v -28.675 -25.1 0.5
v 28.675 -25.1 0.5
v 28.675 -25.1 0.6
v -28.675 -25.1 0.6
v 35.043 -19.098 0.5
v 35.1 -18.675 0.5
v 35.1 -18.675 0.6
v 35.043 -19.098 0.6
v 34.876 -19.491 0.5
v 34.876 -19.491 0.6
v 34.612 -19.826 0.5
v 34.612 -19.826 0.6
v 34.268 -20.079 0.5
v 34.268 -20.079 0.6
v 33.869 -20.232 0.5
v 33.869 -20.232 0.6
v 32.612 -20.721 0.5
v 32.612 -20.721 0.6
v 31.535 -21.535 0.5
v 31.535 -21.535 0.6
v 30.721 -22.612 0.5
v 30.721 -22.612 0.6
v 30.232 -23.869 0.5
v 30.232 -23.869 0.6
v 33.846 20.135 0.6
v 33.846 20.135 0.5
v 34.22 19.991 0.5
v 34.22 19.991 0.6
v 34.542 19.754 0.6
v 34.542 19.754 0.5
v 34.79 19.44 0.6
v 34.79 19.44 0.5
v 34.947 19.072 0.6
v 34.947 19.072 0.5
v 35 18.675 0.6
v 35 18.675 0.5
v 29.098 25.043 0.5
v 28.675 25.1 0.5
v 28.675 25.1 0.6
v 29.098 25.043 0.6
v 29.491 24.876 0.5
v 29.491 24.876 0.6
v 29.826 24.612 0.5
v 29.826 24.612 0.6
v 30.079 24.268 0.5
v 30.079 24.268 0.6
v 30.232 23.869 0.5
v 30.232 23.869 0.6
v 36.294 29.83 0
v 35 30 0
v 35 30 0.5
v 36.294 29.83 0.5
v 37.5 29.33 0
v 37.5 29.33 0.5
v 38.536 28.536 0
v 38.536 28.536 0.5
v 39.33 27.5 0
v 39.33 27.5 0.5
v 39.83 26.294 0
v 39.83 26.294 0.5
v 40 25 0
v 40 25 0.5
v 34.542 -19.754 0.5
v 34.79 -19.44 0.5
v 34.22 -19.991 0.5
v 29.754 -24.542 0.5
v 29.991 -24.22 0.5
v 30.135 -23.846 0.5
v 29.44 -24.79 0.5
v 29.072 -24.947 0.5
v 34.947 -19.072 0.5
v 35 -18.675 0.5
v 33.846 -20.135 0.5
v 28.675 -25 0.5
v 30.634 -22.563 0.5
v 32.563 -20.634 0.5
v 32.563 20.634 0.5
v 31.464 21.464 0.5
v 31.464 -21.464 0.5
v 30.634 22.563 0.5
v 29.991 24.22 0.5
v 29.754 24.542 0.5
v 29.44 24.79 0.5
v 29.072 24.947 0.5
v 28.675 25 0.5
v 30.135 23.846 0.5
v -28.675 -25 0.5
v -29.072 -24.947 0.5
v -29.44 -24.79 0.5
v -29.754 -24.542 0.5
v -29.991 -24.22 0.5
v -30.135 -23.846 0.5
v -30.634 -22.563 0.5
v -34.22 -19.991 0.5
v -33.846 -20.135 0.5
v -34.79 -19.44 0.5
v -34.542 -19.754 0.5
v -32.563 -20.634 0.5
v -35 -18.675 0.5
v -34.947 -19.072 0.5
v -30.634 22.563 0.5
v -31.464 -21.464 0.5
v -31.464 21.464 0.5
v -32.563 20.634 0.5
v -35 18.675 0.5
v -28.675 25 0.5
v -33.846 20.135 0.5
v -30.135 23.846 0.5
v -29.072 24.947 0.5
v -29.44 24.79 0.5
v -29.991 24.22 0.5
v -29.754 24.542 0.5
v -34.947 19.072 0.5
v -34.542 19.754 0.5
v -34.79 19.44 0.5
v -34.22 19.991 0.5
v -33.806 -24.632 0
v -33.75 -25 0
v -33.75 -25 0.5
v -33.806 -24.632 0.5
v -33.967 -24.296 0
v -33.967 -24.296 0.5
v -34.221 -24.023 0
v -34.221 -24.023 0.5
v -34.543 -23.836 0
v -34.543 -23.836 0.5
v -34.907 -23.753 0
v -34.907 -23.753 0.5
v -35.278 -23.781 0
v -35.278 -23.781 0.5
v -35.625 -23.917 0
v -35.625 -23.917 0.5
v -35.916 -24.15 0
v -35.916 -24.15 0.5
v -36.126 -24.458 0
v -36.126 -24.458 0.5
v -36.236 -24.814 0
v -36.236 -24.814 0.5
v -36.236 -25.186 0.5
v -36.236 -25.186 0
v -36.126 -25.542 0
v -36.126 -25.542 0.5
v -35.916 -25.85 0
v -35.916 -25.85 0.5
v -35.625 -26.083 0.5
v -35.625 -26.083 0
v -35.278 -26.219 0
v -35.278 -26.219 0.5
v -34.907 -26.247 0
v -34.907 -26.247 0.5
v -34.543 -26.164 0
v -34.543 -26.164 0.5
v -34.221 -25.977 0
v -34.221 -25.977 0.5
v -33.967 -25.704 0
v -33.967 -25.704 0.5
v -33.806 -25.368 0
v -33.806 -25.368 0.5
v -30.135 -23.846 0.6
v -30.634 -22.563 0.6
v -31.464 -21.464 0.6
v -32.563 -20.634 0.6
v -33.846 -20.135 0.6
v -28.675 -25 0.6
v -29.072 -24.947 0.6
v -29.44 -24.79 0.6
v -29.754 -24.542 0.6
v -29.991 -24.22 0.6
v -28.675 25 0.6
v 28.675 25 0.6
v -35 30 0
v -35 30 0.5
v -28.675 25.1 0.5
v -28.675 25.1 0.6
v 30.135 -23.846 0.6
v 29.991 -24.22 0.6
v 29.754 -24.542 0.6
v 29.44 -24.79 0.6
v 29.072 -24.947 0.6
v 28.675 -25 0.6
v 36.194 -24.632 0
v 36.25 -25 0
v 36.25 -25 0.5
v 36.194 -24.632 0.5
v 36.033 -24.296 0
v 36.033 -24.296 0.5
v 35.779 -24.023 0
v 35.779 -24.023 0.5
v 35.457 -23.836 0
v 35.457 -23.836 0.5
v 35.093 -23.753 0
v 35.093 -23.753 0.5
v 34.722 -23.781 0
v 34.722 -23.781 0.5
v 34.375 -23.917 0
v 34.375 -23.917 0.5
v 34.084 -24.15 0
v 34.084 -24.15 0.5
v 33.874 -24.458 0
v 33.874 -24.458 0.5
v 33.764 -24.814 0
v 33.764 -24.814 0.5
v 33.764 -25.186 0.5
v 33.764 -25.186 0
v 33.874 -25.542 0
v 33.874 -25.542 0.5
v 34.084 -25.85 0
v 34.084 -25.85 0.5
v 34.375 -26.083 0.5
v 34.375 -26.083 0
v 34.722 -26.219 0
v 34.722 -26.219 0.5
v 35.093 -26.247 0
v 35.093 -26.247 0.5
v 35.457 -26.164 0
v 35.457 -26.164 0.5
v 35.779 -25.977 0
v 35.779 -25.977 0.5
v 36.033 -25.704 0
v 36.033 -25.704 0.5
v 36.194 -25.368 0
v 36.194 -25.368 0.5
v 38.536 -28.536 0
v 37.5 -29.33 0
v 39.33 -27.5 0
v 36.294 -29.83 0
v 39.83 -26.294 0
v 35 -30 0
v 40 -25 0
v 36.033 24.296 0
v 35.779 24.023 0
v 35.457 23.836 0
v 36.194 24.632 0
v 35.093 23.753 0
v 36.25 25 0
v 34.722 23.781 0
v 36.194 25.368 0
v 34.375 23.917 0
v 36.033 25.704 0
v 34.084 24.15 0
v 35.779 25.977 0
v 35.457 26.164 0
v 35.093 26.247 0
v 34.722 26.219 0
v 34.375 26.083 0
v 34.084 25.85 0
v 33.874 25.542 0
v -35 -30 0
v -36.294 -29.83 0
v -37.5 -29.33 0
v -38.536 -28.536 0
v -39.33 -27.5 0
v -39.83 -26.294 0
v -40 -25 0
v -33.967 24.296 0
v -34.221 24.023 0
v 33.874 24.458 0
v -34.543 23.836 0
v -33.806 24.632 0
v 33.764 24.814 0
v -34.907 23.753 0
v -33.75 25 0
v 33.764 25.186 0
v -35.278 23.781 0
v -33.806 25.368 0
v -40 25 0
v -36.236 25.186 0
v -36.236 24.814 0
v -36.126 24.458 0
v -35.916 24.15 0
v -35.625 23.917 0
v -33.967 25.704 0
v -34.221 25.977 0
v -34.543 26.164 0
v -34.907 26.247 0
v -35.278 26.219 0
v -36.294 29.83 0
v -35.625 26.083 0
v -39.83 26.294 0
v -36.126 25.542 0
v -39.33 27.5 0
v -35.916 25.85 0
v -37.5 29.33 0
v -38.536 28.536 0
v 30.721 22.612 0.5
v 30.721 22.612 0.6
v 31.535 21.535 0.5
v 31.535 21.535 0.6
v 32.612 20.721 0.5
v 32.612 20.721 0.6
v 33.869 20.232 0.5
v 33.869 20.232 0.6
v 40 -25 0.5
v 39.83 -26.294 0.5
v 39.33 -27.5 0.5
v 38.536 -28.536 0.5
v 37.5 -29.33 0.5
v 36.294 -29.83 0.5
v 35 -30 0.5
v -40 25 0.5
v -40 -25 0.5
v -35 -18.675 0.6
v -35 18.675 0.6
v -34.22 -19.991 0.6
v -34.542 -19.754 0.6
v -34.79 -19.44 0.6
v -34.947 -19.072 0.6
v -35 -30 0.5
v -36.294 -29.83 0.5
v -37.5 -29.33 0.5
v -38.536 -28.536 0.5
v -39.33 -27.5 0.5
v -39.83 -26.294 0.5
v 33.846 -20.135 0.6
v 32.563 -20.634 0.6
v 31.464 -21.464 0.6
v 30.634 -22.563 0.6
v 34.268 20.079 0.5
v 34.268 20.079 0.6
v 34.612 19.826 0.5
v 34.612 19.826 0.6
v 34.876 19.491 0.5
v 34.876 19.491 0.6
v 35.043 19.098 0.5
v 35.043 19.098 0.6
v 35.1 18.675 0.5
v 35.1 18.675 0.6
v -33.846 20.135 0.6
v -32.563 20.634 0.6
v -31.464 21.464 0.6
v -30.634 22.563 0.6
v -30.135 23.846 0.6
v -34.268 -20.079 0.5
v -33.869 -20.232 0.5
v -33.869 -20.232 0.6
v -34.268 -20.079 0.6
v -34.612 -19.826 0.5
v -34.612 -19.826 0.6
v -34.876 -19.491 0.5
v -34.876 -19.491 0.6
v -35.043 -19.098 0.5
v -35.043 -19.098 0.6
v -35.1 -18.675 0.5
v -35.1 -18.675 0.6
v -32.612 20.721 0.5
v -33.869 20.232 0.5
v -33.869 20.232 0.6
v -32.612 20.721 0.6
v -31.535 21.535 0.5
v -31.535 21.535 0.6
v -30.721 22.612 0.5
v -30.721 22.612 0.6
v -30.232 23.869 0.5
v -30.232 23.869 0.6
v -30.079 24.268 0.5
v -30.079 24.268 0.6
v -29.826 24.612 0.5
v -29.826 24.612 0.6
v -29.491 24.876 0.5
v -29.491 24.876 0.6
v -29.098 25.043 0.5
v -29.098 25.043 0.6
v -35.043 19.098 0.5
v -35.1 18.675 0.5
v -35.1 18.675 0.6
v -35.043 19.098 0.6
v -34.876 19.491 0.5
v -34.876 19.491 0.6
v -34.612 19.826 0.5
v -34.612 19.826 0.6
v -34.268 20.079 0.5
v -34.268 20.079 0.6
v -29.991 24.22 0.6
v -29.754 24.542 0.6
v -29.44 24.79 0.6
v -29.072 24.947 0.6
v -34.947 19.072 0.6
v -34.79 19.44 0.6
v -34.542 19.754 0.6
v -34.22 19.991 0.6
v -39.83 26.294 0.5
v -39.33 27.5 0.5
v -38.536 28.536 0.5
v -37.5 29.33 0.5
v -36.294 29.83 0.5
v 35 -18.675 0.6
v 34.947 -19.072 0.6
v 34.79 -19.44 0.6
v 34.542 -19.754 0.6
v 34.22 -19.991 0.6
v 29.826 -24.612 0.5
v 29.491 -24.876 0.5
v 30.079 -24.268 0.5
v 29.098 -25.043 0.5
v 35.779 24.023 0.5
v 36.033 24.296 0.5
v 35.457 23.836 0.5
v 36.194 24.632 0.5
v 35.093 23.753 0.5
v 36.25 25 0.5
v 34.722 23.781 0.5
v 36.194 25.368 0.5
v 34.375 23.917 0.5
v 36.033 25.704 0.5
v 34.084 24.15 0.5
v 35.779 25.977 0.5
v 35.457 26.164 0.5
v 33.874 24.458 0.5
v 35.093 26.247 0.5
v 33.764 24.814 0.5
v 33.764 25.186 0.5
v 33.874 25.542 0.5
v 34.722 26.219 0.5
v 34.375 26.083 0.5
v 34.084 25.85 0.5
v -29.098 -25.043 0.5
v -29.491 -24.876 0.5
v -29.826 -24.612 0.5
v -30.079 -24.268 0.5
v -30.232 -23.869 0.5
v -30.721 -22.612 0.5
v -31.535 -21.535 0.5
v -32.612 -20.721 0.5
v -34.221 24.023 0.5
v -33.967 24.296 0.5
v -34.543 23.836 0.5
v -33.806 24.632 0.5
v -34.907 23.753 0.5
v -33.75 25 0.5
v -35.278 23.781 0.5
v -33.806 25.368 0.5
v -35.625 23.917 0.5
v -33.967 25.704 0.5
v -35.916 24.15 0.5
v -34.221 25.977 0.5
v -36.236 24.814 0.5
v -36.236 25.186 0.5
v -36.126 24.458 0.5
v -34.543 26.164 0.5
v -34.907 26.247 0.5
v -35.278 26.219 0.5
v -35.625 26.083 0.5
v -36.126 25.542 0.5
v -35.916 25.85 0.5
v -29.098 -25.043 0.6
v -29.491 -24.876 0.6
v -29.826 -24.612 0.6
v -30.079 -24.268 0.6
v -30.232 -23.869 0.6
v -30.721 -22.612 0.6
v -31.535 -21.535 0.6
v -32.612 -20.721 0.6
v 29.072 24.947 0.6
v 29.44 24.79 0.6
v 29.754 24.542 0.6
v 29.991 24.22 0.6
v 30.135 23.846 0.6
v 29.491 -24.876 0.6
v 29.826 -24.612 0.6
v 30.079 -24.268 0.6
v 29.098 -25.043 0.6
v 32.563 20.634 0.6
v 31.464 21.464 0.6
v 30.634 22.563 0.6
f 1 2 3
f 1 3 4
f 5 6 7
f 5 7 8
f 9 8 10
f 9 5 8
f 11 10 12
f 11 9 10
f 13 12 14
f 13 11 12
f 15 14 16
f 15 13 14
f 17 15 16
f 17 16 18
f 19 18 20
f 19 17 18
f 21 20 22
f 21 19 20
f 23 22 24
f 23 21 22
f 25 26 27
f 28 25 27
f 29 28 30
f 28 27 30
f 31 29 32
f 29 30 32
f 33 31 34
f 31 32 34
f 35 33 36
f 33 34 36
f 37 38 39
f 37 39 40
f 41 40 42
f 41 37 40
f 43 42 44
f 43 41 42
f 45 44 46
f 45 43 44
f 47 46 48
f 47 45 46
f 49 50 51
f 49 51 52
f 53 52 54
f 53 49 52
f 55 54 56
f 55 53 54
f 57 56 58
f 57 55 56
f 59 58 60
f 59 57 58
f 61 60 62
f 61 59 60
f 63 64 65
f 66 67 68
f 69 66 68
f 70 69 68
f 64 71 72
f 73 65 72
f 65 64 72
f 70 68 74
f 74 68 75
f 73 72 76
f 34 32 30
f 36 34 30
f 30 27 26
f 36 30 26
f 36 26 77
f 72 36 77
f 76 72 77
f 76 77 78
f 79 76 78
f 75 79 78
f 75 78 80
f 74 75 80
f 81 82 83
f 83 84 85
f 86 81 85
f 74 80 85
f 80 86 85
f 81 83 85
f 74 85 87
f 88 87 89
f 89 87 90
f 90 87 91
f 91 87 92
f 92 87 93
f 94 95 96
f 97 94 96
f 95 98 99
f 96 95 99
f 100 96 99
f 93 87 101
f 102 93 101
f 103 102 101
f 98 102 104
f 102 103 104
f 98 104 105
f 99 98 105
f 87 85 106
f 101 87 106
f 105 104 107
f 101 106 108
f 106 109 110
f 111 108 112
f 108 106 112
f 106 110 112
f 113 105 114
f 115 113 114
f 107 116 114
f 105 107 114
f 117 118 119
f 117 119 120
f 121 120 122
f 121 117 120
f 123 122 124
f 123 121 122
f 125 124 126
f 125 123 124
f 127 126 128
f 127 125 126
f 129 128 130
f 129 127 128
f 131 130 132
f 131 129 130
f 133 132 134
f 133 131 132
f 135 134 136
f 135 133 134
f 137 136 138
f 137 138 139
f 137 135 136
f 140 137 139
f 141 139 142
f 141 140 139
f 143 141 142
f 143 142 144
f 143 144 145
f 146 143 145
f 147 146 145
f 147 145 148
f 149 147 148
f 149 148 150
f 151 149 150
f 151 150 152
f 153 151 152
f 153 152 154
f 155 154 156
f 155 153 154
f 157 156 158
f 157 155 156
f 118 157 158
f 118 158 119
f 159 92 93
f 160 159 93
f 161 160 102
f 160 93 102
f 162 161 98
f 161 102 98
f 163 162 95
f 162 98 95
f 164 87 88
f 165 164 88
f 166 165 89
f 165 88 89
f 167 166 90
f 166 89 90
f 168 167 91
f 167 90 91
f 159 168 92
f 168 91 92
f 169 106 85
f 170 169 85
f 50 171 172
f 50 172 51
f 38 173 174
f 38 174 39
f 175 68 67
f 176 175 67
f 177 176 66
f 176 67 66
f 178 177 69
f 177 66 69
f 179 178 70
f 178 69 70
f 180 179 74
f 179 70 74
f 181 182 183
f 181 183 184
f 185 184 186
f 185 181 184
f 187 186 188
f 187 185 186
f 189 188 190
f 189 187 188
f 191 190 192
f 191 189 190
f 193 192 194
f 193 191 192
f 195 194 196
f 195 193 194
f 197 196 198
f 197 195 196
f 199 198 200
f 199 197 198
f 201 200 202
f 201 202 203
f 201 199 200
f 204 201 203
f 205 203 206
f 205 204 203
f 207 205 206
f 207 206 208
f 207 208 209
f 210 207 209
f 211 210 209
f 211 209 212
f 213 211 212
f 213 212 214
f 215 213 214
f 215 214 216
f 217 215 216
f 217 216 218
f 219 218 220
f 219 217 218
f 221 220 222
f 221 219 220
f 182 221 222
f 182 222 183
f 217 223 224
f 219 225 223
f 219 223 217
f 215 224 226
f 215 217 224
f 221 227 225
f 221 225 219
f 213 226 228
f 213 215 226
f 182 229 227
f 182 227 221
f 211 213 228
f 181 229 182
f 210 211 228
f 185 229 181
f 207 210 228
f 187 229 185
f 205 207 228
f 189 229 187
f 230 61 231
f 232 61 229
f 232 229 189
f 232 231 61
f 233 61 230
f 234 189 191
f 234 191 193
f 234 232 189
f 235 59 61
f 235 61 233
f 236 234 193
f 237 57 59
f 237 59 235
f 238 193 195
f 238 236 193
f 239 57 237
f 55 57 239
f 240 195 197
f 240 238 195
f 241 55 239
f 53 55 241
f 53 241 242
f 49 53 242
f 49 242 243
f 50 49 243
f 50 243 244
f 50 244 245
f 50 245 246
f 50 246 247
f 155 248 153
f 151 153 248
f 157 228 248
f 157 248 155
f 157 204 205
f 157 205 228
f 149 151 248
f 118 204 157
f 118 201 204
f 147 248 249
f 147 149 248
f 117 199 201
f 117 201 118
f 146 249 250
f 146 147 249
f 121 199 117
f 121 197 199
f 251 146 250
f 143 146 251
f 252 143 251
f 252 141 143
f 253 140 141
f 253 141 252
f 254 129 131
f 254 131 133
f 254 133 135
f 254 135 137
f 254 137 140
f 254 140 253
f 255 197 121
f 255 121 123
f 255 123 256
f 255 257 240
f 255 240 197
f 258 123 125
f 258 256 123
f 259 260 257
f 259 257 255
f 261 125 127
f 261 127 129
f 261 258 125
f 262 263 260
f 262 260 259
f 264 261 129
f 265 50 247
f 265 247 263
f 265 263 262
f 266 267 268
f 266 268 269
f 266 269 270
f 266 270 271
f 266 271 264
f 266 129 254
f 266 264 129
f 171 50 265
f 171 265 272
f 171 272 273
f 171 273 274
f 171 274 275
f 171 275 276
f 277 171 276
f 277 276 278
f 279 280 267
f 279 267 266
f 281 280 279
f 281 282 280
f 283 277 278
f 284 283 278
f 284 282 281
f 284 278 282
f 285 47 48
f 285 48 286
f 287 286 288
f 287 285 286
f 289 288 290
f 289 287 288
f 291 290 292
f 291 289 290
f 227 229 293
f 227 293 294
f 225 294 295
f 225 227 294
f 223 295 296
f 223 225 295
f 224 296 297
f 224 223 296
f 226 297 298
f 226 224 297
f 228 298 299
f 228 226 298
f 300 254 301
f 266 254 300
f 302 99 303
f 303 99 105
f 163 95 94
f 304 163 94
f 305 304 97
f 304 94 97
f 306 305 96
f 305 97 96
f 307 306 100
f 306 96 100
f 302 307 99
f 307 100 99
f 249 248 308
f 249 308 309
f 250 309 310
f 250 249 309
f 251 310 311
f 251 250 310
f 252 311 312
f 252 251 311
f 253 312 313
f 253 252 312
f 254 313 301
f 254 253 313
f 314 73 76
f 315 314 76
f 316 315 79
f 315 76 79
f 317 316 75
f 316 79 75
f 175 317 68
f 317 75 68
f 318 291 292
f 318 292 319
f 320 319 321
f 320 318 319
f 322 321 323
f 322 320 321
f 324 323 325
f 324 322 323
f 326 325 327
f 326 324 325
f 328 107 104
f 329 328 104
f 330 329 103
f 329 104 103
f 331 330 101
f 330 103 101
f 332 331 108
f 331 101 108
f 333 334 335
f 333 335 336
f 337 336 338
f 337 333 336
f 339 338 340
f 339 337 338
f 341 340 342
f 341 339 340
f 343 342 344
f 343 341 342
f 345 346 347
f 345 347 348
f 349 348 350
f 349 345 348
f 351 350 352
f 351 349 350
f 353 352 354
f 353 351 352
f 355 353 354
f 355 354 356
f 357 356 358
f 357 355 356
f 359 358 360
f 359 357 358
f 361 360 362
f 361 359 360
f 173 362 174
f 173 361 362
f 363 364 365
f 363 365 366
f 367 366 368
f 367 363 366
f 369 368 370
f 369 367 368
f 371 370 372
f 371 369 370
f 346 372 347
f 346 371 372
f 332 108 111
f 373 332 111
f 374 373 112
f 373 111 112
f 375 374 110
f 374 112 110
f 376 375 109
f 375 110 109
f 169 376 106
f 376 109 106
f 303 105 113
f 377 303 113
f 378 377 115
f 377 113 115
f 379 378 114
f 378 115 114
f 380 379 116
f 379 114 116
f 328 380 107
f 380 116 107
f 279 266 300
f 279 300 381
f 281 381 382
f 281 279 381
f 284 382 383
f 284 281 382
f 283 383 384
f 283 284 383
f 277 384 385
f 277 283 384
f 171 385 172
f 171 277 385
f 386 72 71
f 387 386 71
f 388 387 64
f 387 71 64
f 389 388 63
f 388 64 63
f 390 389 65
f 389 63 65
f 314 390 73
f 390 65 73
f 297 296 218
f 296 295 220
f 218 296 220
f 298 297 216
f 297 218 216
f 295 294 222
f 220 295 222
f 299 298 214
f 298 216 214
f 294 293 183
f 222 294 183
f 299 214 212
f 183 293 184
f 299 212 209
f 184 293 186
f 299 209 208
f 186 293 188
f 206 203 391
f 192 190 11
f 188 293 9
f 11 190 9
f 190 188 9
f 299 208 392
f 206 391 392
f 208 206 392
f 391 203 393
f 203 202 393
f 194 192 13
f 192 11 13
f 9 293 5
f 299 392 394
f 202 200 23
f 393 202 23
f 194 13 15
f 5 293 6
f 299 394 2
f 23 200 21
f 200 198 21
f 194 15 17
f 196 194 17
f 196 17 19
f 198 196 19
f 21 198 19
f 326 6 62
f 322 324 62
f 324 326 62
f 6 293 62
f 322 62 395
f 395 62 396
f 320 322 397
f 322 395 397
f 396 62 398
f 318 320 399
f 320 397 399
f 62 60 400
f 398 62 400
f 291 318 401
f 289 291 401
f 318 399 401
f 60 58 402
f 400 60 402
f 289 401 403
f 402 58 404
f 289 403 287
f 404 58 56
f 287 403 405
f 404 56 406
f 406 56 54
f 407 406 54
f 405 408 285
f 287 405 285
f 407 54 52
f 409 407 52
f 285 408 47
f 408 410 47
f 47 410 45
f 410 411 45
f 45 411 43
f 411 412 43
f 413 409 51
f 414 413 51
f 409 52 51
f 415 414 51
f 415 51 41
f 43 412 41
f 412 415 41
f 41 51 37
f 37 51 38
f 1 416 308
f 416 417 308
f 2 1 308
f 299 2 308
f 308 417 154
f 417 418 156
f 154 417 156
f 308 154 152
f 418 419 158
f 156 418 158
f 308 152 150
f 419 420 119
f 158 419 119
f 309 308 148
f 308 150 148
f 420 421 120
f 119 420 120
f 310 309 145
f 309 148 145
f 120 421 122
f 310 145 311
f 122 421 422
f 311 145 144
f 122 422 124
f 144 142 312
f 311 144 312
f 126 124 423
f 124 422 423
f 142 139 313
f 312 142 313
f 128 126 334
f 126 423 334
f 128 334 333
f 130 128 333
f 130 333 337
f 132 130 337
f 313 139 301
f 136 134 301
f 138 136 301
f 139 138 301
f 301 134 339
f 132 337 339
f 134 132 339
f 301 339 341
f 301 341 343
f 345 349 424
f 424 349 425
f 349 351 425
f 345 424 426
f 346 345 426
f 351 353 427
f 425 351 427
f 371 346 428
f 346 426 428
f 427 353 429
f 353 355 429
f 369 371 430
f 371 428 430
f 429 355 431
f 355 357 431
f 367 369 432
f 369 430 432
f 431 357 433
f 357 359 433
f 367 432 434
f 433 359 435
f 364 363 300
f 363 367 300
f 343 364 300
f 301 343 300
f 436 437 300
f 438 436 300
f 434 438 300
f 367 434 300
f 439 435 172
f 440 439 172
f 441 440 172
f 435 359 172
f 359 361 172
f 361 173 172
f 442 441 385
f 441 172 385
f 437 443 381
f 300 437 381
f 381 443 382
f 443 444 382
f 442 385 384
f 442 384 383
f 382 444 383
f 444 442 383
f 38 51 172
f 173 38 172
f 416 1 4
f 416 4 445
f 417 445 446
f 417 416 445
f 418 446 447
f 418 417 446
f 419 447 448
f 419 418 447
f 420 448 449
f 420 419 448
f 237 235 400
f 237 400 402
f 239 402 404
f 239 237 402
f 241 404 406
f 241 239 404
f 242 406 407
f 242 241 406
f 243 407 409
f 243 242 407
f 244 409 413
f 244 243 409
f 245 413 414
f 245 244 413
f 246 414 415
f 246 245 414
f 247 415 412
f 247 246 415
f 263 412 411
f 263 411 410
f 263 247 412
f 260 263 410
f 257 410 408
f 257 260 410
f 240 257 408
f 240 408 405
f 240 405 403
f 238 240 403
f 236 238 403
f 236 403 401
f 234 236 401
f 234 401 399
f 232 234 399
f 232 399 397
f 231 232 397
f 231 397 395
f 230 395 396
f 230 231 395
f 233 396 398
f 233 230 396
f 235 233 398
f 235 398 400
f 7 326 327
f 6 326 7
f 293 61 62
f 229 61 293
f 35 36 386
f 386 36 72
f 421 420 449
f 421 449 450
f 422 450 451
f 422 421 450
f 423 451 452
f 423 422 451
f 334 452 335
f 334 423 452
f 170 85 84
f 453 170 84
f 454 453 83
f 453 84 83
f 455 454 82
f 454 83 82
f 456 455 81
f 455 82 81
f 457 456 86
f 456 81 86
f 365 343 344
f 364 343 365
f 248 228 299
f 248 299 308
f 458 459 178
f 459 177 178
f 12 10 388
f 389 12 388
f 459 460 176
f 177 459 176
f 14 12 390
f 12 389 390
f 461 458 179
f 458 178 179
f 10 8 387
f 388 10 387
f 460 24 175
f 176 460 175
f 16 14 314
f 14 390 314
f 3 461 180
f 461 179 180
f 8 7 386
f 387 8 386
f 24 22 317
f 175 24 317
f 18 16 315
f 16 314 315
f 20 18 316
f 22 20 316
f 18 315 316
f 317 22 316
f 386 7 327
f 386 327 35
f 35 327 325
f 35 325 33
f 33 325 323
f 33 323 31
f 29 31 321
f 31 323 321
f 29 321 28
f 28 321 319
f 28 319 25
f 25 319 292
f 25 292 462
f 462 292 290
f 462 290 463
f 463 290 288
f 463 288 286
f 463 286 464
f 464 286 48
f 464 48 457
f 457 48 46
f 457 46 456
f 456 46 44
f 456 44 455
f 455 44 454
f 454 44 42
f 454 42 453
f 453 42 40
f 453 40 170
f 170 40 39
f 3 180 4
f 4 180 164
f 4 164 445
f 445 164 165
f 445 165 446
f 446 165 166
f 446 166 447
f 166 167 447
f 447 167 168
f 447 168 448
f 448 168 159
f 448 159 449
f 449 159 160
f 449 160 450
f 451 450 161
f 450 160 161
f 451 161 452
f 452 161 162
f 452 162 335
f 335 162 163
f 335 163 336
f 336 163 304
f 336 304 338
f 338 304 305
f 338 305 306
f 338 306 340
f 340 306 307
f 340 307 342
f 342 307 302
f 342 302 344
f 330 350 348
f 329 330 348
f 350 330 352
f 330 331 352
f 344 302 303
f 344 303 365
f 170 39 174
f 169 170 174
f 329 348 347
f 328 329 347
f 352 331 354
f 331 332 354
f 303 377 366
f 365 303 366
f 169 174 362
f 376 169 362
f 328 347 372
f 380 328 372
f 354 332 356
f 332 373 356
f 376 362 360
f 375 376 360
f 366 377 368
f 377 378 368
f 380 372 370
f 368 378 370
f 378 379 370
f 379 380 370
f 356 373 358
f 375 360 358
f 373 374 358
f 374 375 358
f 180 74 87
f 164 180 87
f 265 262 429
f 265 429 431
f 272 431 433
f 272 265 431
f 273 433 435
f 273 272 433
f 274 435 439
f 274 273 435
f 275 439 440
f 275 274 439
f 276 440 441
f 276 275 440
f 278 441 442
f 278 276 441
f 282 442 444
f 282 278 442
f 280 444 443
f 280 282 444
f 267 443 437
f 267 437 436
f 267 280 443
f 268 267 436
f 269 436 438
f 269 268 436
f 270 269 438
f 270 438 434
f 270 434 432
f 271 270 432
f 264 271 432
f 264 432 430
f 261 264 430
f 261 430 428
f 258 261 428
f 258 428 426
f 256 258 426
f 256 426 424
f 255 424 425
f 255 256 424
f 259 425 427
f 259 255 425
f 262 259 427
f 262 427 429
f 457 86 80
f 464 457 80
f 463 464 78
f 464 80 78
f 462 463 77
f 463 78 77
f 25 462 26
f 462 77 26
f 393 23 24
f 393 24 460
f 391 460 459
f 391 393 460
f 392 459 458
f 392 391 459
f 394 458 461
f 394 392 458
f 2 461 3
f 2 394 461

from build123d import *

# Parameters (mm, degrees)
SKETCH_1_R      = 1.25
EXTRUDE_1_DEPTH = 0.5
EXTRUDE_5_DEPTH = 0.1


with BuildPart() as part:
    # 草图1 → 凸台-拉伸1 (new body)
    with BuildSketch(Plane.XY):
        with BuildLine():
            Line((-35, 30), (35, 30))
            ThreePointArc((35, 30), (38.535533906, 28.535533906), (40, 25))
            Line((40, 25), (40, -25))
            ThreePointArc((40, -25), (38.535533906, -28.535533906), (35, -30))
            Line((35, -30), (-35, -30))
            ThreePointArc((-35, -30), (-38.535533906, -28.535533906), (-40, -25))
            Line((-40, -25), (-40, 25))
            ThreePointArc((-40, 25), (-38.535533906, 28.535533906), (-35, 30))
        make_face()
        with Locations((35, 25)):
            Circle(SKETCH_1_R, mode=Mode.SUBTRACT)
        with Locations((-35, 25)):
            Circle(SKETCH_1_R, mode=Mode.SUBTRACT)
        with Locations((-35, -25)):
            Circle(SKETCH_1_R, mode=Mode.SUBTRACT)
        with Locations((35, -25)):
            Circle(SKETCH_1_R, mode=Mode.SUBTRACT)
    extrude(amount=EXTRUDE_1_DEPTH)

    # 草图4 → 凸台-拉伸5 (add)
    with BuildSketch(Plane.XY.offset(0.5)):
        with BuildLine():
            Line((-28.67544468, 25.1), (28.67544468, 25.1))
            ThreePointArc((28.67544468, 25.1), (29.667722556, 24.755143265), (30.232258297, 23.869230769))
            ThreePointArc((30.232258297, 23.869230769), (31.535176772, 21.535176772), (33.869230769, 20.232258297))
            ThreePointArc((33.869230769, 20.232258297), (34.755143265, 19.667722556), (35.1, 18.67544468))
            Line((35.1, 18.67544468), (35.1, -18.67544468))
            ThreePointArc((35.1, -18.67544468), (34.755143265, -19.667722556), (33.869230769, -20.232258297))
            ThreePointArc((33.869230769, -20.232258297), (31.535176772, -21.535176772), (30.232258297, -23.869230769))
            ThreePointArc((30.232258297, -23.869230769), (29.667722556, -24.755143265), (28.67544468, -25.1))
            Line((28.67544468, -25.1), (-28.67544468, -25.1))
            ThreePointArc((-28.67544468, -25.1), (-29.667722556, -24.755143265), (-30.232258297, -23.869230769))
            ThreePointArc((-30.232258297, -23.869230769), (-31.535176772, -21.535176772), (-33.869230769, -20.232258297))
            ThreePointArc((-33.869230769, -20.232258297), (-34.755143265, -19.667722556), (-35.1, -18.67544468))
            Line((-35.1, -18.67544468), (-35.1, 18.67544468))
            ThreePointArc((-35.1, 18.67544468), (-34.755143265, 19.667722556), (-33.869230769, 20.232258297))
            ThreePointArc((-33.869230769, 20.232258297), (-31.535176772, 21.535176772), (-30.232258297, 23.869230769))
            ThreePointArc((-30.232258297, 23.869230769), (-29.667722556, 24.755143265), (-28.67544468, 25.1))
        make_face()
        with BuildLine():
            Line((-28.67544468, 25), (28.67544468, 25))
            ThreePointArc((28.67544468, 25), (29.605705189, 24.676696811), (30.134957446, 23.846153846))
            ThreePointArc((30.134957446, 23.846153846), (31.464466094, 21.464466094), (33.846153846, 20.134957446))
            ThreePointArc((33.846153846, 20.134957446), (34.676696811, 19.605705189), (35, 18.67544468))
            Line((35, 18.67544468), (35, -18.67544468))
            ThreePointArc((35, -18.67544468), (34.676696811, -19.605705189), (33.846153846, -20.134957446))
            ThreePointArc((33.846153846, -20.134957446), (31.464466094, -21.464466094), (30.134957446, -23.846153846))
            ThreePointArc((30.134957446, -23.846153846), (29.605705189, -24.676696811), (28.67544468, -25))
            Line((28.67544468, -25), (-28.67544468, -25))
            ThreePointArc((-28.67544468, -25), (-29.605705189, -24.676696811), (-30.134957446, -23.846153846))
            ThreePointArc((-30.134957446, -23.846153846), (-31.464466094, -21.464466094), (-33.846153846, -20.134957446))
            ThreePointArc((-33.846153846, -20.134957446), (-34.676696811, -19.605705189), (-35, -18.67544468))
            Line((-35, -18.67544468), (-35, 18.67544468))
            ThreePointArc((-35, 18.67544468), (-34.676696811, 19.605705189), (-33.846153846, 20.134957446))
            ThreePointArc((-33.846153846, 20.134957446), (-31.464466094, 21.464466094), (-30.134957446, 23.846153846))
            ThreePointArc((-30.134957446, 23.846153846), (-29.605705189, 24.676696811), (-28.67544468, 25))
        make_face(mode=Mode.SUBTRACT)
    extrude(amount=EXTRUDE_5_DEPTH)


solid = part.part
